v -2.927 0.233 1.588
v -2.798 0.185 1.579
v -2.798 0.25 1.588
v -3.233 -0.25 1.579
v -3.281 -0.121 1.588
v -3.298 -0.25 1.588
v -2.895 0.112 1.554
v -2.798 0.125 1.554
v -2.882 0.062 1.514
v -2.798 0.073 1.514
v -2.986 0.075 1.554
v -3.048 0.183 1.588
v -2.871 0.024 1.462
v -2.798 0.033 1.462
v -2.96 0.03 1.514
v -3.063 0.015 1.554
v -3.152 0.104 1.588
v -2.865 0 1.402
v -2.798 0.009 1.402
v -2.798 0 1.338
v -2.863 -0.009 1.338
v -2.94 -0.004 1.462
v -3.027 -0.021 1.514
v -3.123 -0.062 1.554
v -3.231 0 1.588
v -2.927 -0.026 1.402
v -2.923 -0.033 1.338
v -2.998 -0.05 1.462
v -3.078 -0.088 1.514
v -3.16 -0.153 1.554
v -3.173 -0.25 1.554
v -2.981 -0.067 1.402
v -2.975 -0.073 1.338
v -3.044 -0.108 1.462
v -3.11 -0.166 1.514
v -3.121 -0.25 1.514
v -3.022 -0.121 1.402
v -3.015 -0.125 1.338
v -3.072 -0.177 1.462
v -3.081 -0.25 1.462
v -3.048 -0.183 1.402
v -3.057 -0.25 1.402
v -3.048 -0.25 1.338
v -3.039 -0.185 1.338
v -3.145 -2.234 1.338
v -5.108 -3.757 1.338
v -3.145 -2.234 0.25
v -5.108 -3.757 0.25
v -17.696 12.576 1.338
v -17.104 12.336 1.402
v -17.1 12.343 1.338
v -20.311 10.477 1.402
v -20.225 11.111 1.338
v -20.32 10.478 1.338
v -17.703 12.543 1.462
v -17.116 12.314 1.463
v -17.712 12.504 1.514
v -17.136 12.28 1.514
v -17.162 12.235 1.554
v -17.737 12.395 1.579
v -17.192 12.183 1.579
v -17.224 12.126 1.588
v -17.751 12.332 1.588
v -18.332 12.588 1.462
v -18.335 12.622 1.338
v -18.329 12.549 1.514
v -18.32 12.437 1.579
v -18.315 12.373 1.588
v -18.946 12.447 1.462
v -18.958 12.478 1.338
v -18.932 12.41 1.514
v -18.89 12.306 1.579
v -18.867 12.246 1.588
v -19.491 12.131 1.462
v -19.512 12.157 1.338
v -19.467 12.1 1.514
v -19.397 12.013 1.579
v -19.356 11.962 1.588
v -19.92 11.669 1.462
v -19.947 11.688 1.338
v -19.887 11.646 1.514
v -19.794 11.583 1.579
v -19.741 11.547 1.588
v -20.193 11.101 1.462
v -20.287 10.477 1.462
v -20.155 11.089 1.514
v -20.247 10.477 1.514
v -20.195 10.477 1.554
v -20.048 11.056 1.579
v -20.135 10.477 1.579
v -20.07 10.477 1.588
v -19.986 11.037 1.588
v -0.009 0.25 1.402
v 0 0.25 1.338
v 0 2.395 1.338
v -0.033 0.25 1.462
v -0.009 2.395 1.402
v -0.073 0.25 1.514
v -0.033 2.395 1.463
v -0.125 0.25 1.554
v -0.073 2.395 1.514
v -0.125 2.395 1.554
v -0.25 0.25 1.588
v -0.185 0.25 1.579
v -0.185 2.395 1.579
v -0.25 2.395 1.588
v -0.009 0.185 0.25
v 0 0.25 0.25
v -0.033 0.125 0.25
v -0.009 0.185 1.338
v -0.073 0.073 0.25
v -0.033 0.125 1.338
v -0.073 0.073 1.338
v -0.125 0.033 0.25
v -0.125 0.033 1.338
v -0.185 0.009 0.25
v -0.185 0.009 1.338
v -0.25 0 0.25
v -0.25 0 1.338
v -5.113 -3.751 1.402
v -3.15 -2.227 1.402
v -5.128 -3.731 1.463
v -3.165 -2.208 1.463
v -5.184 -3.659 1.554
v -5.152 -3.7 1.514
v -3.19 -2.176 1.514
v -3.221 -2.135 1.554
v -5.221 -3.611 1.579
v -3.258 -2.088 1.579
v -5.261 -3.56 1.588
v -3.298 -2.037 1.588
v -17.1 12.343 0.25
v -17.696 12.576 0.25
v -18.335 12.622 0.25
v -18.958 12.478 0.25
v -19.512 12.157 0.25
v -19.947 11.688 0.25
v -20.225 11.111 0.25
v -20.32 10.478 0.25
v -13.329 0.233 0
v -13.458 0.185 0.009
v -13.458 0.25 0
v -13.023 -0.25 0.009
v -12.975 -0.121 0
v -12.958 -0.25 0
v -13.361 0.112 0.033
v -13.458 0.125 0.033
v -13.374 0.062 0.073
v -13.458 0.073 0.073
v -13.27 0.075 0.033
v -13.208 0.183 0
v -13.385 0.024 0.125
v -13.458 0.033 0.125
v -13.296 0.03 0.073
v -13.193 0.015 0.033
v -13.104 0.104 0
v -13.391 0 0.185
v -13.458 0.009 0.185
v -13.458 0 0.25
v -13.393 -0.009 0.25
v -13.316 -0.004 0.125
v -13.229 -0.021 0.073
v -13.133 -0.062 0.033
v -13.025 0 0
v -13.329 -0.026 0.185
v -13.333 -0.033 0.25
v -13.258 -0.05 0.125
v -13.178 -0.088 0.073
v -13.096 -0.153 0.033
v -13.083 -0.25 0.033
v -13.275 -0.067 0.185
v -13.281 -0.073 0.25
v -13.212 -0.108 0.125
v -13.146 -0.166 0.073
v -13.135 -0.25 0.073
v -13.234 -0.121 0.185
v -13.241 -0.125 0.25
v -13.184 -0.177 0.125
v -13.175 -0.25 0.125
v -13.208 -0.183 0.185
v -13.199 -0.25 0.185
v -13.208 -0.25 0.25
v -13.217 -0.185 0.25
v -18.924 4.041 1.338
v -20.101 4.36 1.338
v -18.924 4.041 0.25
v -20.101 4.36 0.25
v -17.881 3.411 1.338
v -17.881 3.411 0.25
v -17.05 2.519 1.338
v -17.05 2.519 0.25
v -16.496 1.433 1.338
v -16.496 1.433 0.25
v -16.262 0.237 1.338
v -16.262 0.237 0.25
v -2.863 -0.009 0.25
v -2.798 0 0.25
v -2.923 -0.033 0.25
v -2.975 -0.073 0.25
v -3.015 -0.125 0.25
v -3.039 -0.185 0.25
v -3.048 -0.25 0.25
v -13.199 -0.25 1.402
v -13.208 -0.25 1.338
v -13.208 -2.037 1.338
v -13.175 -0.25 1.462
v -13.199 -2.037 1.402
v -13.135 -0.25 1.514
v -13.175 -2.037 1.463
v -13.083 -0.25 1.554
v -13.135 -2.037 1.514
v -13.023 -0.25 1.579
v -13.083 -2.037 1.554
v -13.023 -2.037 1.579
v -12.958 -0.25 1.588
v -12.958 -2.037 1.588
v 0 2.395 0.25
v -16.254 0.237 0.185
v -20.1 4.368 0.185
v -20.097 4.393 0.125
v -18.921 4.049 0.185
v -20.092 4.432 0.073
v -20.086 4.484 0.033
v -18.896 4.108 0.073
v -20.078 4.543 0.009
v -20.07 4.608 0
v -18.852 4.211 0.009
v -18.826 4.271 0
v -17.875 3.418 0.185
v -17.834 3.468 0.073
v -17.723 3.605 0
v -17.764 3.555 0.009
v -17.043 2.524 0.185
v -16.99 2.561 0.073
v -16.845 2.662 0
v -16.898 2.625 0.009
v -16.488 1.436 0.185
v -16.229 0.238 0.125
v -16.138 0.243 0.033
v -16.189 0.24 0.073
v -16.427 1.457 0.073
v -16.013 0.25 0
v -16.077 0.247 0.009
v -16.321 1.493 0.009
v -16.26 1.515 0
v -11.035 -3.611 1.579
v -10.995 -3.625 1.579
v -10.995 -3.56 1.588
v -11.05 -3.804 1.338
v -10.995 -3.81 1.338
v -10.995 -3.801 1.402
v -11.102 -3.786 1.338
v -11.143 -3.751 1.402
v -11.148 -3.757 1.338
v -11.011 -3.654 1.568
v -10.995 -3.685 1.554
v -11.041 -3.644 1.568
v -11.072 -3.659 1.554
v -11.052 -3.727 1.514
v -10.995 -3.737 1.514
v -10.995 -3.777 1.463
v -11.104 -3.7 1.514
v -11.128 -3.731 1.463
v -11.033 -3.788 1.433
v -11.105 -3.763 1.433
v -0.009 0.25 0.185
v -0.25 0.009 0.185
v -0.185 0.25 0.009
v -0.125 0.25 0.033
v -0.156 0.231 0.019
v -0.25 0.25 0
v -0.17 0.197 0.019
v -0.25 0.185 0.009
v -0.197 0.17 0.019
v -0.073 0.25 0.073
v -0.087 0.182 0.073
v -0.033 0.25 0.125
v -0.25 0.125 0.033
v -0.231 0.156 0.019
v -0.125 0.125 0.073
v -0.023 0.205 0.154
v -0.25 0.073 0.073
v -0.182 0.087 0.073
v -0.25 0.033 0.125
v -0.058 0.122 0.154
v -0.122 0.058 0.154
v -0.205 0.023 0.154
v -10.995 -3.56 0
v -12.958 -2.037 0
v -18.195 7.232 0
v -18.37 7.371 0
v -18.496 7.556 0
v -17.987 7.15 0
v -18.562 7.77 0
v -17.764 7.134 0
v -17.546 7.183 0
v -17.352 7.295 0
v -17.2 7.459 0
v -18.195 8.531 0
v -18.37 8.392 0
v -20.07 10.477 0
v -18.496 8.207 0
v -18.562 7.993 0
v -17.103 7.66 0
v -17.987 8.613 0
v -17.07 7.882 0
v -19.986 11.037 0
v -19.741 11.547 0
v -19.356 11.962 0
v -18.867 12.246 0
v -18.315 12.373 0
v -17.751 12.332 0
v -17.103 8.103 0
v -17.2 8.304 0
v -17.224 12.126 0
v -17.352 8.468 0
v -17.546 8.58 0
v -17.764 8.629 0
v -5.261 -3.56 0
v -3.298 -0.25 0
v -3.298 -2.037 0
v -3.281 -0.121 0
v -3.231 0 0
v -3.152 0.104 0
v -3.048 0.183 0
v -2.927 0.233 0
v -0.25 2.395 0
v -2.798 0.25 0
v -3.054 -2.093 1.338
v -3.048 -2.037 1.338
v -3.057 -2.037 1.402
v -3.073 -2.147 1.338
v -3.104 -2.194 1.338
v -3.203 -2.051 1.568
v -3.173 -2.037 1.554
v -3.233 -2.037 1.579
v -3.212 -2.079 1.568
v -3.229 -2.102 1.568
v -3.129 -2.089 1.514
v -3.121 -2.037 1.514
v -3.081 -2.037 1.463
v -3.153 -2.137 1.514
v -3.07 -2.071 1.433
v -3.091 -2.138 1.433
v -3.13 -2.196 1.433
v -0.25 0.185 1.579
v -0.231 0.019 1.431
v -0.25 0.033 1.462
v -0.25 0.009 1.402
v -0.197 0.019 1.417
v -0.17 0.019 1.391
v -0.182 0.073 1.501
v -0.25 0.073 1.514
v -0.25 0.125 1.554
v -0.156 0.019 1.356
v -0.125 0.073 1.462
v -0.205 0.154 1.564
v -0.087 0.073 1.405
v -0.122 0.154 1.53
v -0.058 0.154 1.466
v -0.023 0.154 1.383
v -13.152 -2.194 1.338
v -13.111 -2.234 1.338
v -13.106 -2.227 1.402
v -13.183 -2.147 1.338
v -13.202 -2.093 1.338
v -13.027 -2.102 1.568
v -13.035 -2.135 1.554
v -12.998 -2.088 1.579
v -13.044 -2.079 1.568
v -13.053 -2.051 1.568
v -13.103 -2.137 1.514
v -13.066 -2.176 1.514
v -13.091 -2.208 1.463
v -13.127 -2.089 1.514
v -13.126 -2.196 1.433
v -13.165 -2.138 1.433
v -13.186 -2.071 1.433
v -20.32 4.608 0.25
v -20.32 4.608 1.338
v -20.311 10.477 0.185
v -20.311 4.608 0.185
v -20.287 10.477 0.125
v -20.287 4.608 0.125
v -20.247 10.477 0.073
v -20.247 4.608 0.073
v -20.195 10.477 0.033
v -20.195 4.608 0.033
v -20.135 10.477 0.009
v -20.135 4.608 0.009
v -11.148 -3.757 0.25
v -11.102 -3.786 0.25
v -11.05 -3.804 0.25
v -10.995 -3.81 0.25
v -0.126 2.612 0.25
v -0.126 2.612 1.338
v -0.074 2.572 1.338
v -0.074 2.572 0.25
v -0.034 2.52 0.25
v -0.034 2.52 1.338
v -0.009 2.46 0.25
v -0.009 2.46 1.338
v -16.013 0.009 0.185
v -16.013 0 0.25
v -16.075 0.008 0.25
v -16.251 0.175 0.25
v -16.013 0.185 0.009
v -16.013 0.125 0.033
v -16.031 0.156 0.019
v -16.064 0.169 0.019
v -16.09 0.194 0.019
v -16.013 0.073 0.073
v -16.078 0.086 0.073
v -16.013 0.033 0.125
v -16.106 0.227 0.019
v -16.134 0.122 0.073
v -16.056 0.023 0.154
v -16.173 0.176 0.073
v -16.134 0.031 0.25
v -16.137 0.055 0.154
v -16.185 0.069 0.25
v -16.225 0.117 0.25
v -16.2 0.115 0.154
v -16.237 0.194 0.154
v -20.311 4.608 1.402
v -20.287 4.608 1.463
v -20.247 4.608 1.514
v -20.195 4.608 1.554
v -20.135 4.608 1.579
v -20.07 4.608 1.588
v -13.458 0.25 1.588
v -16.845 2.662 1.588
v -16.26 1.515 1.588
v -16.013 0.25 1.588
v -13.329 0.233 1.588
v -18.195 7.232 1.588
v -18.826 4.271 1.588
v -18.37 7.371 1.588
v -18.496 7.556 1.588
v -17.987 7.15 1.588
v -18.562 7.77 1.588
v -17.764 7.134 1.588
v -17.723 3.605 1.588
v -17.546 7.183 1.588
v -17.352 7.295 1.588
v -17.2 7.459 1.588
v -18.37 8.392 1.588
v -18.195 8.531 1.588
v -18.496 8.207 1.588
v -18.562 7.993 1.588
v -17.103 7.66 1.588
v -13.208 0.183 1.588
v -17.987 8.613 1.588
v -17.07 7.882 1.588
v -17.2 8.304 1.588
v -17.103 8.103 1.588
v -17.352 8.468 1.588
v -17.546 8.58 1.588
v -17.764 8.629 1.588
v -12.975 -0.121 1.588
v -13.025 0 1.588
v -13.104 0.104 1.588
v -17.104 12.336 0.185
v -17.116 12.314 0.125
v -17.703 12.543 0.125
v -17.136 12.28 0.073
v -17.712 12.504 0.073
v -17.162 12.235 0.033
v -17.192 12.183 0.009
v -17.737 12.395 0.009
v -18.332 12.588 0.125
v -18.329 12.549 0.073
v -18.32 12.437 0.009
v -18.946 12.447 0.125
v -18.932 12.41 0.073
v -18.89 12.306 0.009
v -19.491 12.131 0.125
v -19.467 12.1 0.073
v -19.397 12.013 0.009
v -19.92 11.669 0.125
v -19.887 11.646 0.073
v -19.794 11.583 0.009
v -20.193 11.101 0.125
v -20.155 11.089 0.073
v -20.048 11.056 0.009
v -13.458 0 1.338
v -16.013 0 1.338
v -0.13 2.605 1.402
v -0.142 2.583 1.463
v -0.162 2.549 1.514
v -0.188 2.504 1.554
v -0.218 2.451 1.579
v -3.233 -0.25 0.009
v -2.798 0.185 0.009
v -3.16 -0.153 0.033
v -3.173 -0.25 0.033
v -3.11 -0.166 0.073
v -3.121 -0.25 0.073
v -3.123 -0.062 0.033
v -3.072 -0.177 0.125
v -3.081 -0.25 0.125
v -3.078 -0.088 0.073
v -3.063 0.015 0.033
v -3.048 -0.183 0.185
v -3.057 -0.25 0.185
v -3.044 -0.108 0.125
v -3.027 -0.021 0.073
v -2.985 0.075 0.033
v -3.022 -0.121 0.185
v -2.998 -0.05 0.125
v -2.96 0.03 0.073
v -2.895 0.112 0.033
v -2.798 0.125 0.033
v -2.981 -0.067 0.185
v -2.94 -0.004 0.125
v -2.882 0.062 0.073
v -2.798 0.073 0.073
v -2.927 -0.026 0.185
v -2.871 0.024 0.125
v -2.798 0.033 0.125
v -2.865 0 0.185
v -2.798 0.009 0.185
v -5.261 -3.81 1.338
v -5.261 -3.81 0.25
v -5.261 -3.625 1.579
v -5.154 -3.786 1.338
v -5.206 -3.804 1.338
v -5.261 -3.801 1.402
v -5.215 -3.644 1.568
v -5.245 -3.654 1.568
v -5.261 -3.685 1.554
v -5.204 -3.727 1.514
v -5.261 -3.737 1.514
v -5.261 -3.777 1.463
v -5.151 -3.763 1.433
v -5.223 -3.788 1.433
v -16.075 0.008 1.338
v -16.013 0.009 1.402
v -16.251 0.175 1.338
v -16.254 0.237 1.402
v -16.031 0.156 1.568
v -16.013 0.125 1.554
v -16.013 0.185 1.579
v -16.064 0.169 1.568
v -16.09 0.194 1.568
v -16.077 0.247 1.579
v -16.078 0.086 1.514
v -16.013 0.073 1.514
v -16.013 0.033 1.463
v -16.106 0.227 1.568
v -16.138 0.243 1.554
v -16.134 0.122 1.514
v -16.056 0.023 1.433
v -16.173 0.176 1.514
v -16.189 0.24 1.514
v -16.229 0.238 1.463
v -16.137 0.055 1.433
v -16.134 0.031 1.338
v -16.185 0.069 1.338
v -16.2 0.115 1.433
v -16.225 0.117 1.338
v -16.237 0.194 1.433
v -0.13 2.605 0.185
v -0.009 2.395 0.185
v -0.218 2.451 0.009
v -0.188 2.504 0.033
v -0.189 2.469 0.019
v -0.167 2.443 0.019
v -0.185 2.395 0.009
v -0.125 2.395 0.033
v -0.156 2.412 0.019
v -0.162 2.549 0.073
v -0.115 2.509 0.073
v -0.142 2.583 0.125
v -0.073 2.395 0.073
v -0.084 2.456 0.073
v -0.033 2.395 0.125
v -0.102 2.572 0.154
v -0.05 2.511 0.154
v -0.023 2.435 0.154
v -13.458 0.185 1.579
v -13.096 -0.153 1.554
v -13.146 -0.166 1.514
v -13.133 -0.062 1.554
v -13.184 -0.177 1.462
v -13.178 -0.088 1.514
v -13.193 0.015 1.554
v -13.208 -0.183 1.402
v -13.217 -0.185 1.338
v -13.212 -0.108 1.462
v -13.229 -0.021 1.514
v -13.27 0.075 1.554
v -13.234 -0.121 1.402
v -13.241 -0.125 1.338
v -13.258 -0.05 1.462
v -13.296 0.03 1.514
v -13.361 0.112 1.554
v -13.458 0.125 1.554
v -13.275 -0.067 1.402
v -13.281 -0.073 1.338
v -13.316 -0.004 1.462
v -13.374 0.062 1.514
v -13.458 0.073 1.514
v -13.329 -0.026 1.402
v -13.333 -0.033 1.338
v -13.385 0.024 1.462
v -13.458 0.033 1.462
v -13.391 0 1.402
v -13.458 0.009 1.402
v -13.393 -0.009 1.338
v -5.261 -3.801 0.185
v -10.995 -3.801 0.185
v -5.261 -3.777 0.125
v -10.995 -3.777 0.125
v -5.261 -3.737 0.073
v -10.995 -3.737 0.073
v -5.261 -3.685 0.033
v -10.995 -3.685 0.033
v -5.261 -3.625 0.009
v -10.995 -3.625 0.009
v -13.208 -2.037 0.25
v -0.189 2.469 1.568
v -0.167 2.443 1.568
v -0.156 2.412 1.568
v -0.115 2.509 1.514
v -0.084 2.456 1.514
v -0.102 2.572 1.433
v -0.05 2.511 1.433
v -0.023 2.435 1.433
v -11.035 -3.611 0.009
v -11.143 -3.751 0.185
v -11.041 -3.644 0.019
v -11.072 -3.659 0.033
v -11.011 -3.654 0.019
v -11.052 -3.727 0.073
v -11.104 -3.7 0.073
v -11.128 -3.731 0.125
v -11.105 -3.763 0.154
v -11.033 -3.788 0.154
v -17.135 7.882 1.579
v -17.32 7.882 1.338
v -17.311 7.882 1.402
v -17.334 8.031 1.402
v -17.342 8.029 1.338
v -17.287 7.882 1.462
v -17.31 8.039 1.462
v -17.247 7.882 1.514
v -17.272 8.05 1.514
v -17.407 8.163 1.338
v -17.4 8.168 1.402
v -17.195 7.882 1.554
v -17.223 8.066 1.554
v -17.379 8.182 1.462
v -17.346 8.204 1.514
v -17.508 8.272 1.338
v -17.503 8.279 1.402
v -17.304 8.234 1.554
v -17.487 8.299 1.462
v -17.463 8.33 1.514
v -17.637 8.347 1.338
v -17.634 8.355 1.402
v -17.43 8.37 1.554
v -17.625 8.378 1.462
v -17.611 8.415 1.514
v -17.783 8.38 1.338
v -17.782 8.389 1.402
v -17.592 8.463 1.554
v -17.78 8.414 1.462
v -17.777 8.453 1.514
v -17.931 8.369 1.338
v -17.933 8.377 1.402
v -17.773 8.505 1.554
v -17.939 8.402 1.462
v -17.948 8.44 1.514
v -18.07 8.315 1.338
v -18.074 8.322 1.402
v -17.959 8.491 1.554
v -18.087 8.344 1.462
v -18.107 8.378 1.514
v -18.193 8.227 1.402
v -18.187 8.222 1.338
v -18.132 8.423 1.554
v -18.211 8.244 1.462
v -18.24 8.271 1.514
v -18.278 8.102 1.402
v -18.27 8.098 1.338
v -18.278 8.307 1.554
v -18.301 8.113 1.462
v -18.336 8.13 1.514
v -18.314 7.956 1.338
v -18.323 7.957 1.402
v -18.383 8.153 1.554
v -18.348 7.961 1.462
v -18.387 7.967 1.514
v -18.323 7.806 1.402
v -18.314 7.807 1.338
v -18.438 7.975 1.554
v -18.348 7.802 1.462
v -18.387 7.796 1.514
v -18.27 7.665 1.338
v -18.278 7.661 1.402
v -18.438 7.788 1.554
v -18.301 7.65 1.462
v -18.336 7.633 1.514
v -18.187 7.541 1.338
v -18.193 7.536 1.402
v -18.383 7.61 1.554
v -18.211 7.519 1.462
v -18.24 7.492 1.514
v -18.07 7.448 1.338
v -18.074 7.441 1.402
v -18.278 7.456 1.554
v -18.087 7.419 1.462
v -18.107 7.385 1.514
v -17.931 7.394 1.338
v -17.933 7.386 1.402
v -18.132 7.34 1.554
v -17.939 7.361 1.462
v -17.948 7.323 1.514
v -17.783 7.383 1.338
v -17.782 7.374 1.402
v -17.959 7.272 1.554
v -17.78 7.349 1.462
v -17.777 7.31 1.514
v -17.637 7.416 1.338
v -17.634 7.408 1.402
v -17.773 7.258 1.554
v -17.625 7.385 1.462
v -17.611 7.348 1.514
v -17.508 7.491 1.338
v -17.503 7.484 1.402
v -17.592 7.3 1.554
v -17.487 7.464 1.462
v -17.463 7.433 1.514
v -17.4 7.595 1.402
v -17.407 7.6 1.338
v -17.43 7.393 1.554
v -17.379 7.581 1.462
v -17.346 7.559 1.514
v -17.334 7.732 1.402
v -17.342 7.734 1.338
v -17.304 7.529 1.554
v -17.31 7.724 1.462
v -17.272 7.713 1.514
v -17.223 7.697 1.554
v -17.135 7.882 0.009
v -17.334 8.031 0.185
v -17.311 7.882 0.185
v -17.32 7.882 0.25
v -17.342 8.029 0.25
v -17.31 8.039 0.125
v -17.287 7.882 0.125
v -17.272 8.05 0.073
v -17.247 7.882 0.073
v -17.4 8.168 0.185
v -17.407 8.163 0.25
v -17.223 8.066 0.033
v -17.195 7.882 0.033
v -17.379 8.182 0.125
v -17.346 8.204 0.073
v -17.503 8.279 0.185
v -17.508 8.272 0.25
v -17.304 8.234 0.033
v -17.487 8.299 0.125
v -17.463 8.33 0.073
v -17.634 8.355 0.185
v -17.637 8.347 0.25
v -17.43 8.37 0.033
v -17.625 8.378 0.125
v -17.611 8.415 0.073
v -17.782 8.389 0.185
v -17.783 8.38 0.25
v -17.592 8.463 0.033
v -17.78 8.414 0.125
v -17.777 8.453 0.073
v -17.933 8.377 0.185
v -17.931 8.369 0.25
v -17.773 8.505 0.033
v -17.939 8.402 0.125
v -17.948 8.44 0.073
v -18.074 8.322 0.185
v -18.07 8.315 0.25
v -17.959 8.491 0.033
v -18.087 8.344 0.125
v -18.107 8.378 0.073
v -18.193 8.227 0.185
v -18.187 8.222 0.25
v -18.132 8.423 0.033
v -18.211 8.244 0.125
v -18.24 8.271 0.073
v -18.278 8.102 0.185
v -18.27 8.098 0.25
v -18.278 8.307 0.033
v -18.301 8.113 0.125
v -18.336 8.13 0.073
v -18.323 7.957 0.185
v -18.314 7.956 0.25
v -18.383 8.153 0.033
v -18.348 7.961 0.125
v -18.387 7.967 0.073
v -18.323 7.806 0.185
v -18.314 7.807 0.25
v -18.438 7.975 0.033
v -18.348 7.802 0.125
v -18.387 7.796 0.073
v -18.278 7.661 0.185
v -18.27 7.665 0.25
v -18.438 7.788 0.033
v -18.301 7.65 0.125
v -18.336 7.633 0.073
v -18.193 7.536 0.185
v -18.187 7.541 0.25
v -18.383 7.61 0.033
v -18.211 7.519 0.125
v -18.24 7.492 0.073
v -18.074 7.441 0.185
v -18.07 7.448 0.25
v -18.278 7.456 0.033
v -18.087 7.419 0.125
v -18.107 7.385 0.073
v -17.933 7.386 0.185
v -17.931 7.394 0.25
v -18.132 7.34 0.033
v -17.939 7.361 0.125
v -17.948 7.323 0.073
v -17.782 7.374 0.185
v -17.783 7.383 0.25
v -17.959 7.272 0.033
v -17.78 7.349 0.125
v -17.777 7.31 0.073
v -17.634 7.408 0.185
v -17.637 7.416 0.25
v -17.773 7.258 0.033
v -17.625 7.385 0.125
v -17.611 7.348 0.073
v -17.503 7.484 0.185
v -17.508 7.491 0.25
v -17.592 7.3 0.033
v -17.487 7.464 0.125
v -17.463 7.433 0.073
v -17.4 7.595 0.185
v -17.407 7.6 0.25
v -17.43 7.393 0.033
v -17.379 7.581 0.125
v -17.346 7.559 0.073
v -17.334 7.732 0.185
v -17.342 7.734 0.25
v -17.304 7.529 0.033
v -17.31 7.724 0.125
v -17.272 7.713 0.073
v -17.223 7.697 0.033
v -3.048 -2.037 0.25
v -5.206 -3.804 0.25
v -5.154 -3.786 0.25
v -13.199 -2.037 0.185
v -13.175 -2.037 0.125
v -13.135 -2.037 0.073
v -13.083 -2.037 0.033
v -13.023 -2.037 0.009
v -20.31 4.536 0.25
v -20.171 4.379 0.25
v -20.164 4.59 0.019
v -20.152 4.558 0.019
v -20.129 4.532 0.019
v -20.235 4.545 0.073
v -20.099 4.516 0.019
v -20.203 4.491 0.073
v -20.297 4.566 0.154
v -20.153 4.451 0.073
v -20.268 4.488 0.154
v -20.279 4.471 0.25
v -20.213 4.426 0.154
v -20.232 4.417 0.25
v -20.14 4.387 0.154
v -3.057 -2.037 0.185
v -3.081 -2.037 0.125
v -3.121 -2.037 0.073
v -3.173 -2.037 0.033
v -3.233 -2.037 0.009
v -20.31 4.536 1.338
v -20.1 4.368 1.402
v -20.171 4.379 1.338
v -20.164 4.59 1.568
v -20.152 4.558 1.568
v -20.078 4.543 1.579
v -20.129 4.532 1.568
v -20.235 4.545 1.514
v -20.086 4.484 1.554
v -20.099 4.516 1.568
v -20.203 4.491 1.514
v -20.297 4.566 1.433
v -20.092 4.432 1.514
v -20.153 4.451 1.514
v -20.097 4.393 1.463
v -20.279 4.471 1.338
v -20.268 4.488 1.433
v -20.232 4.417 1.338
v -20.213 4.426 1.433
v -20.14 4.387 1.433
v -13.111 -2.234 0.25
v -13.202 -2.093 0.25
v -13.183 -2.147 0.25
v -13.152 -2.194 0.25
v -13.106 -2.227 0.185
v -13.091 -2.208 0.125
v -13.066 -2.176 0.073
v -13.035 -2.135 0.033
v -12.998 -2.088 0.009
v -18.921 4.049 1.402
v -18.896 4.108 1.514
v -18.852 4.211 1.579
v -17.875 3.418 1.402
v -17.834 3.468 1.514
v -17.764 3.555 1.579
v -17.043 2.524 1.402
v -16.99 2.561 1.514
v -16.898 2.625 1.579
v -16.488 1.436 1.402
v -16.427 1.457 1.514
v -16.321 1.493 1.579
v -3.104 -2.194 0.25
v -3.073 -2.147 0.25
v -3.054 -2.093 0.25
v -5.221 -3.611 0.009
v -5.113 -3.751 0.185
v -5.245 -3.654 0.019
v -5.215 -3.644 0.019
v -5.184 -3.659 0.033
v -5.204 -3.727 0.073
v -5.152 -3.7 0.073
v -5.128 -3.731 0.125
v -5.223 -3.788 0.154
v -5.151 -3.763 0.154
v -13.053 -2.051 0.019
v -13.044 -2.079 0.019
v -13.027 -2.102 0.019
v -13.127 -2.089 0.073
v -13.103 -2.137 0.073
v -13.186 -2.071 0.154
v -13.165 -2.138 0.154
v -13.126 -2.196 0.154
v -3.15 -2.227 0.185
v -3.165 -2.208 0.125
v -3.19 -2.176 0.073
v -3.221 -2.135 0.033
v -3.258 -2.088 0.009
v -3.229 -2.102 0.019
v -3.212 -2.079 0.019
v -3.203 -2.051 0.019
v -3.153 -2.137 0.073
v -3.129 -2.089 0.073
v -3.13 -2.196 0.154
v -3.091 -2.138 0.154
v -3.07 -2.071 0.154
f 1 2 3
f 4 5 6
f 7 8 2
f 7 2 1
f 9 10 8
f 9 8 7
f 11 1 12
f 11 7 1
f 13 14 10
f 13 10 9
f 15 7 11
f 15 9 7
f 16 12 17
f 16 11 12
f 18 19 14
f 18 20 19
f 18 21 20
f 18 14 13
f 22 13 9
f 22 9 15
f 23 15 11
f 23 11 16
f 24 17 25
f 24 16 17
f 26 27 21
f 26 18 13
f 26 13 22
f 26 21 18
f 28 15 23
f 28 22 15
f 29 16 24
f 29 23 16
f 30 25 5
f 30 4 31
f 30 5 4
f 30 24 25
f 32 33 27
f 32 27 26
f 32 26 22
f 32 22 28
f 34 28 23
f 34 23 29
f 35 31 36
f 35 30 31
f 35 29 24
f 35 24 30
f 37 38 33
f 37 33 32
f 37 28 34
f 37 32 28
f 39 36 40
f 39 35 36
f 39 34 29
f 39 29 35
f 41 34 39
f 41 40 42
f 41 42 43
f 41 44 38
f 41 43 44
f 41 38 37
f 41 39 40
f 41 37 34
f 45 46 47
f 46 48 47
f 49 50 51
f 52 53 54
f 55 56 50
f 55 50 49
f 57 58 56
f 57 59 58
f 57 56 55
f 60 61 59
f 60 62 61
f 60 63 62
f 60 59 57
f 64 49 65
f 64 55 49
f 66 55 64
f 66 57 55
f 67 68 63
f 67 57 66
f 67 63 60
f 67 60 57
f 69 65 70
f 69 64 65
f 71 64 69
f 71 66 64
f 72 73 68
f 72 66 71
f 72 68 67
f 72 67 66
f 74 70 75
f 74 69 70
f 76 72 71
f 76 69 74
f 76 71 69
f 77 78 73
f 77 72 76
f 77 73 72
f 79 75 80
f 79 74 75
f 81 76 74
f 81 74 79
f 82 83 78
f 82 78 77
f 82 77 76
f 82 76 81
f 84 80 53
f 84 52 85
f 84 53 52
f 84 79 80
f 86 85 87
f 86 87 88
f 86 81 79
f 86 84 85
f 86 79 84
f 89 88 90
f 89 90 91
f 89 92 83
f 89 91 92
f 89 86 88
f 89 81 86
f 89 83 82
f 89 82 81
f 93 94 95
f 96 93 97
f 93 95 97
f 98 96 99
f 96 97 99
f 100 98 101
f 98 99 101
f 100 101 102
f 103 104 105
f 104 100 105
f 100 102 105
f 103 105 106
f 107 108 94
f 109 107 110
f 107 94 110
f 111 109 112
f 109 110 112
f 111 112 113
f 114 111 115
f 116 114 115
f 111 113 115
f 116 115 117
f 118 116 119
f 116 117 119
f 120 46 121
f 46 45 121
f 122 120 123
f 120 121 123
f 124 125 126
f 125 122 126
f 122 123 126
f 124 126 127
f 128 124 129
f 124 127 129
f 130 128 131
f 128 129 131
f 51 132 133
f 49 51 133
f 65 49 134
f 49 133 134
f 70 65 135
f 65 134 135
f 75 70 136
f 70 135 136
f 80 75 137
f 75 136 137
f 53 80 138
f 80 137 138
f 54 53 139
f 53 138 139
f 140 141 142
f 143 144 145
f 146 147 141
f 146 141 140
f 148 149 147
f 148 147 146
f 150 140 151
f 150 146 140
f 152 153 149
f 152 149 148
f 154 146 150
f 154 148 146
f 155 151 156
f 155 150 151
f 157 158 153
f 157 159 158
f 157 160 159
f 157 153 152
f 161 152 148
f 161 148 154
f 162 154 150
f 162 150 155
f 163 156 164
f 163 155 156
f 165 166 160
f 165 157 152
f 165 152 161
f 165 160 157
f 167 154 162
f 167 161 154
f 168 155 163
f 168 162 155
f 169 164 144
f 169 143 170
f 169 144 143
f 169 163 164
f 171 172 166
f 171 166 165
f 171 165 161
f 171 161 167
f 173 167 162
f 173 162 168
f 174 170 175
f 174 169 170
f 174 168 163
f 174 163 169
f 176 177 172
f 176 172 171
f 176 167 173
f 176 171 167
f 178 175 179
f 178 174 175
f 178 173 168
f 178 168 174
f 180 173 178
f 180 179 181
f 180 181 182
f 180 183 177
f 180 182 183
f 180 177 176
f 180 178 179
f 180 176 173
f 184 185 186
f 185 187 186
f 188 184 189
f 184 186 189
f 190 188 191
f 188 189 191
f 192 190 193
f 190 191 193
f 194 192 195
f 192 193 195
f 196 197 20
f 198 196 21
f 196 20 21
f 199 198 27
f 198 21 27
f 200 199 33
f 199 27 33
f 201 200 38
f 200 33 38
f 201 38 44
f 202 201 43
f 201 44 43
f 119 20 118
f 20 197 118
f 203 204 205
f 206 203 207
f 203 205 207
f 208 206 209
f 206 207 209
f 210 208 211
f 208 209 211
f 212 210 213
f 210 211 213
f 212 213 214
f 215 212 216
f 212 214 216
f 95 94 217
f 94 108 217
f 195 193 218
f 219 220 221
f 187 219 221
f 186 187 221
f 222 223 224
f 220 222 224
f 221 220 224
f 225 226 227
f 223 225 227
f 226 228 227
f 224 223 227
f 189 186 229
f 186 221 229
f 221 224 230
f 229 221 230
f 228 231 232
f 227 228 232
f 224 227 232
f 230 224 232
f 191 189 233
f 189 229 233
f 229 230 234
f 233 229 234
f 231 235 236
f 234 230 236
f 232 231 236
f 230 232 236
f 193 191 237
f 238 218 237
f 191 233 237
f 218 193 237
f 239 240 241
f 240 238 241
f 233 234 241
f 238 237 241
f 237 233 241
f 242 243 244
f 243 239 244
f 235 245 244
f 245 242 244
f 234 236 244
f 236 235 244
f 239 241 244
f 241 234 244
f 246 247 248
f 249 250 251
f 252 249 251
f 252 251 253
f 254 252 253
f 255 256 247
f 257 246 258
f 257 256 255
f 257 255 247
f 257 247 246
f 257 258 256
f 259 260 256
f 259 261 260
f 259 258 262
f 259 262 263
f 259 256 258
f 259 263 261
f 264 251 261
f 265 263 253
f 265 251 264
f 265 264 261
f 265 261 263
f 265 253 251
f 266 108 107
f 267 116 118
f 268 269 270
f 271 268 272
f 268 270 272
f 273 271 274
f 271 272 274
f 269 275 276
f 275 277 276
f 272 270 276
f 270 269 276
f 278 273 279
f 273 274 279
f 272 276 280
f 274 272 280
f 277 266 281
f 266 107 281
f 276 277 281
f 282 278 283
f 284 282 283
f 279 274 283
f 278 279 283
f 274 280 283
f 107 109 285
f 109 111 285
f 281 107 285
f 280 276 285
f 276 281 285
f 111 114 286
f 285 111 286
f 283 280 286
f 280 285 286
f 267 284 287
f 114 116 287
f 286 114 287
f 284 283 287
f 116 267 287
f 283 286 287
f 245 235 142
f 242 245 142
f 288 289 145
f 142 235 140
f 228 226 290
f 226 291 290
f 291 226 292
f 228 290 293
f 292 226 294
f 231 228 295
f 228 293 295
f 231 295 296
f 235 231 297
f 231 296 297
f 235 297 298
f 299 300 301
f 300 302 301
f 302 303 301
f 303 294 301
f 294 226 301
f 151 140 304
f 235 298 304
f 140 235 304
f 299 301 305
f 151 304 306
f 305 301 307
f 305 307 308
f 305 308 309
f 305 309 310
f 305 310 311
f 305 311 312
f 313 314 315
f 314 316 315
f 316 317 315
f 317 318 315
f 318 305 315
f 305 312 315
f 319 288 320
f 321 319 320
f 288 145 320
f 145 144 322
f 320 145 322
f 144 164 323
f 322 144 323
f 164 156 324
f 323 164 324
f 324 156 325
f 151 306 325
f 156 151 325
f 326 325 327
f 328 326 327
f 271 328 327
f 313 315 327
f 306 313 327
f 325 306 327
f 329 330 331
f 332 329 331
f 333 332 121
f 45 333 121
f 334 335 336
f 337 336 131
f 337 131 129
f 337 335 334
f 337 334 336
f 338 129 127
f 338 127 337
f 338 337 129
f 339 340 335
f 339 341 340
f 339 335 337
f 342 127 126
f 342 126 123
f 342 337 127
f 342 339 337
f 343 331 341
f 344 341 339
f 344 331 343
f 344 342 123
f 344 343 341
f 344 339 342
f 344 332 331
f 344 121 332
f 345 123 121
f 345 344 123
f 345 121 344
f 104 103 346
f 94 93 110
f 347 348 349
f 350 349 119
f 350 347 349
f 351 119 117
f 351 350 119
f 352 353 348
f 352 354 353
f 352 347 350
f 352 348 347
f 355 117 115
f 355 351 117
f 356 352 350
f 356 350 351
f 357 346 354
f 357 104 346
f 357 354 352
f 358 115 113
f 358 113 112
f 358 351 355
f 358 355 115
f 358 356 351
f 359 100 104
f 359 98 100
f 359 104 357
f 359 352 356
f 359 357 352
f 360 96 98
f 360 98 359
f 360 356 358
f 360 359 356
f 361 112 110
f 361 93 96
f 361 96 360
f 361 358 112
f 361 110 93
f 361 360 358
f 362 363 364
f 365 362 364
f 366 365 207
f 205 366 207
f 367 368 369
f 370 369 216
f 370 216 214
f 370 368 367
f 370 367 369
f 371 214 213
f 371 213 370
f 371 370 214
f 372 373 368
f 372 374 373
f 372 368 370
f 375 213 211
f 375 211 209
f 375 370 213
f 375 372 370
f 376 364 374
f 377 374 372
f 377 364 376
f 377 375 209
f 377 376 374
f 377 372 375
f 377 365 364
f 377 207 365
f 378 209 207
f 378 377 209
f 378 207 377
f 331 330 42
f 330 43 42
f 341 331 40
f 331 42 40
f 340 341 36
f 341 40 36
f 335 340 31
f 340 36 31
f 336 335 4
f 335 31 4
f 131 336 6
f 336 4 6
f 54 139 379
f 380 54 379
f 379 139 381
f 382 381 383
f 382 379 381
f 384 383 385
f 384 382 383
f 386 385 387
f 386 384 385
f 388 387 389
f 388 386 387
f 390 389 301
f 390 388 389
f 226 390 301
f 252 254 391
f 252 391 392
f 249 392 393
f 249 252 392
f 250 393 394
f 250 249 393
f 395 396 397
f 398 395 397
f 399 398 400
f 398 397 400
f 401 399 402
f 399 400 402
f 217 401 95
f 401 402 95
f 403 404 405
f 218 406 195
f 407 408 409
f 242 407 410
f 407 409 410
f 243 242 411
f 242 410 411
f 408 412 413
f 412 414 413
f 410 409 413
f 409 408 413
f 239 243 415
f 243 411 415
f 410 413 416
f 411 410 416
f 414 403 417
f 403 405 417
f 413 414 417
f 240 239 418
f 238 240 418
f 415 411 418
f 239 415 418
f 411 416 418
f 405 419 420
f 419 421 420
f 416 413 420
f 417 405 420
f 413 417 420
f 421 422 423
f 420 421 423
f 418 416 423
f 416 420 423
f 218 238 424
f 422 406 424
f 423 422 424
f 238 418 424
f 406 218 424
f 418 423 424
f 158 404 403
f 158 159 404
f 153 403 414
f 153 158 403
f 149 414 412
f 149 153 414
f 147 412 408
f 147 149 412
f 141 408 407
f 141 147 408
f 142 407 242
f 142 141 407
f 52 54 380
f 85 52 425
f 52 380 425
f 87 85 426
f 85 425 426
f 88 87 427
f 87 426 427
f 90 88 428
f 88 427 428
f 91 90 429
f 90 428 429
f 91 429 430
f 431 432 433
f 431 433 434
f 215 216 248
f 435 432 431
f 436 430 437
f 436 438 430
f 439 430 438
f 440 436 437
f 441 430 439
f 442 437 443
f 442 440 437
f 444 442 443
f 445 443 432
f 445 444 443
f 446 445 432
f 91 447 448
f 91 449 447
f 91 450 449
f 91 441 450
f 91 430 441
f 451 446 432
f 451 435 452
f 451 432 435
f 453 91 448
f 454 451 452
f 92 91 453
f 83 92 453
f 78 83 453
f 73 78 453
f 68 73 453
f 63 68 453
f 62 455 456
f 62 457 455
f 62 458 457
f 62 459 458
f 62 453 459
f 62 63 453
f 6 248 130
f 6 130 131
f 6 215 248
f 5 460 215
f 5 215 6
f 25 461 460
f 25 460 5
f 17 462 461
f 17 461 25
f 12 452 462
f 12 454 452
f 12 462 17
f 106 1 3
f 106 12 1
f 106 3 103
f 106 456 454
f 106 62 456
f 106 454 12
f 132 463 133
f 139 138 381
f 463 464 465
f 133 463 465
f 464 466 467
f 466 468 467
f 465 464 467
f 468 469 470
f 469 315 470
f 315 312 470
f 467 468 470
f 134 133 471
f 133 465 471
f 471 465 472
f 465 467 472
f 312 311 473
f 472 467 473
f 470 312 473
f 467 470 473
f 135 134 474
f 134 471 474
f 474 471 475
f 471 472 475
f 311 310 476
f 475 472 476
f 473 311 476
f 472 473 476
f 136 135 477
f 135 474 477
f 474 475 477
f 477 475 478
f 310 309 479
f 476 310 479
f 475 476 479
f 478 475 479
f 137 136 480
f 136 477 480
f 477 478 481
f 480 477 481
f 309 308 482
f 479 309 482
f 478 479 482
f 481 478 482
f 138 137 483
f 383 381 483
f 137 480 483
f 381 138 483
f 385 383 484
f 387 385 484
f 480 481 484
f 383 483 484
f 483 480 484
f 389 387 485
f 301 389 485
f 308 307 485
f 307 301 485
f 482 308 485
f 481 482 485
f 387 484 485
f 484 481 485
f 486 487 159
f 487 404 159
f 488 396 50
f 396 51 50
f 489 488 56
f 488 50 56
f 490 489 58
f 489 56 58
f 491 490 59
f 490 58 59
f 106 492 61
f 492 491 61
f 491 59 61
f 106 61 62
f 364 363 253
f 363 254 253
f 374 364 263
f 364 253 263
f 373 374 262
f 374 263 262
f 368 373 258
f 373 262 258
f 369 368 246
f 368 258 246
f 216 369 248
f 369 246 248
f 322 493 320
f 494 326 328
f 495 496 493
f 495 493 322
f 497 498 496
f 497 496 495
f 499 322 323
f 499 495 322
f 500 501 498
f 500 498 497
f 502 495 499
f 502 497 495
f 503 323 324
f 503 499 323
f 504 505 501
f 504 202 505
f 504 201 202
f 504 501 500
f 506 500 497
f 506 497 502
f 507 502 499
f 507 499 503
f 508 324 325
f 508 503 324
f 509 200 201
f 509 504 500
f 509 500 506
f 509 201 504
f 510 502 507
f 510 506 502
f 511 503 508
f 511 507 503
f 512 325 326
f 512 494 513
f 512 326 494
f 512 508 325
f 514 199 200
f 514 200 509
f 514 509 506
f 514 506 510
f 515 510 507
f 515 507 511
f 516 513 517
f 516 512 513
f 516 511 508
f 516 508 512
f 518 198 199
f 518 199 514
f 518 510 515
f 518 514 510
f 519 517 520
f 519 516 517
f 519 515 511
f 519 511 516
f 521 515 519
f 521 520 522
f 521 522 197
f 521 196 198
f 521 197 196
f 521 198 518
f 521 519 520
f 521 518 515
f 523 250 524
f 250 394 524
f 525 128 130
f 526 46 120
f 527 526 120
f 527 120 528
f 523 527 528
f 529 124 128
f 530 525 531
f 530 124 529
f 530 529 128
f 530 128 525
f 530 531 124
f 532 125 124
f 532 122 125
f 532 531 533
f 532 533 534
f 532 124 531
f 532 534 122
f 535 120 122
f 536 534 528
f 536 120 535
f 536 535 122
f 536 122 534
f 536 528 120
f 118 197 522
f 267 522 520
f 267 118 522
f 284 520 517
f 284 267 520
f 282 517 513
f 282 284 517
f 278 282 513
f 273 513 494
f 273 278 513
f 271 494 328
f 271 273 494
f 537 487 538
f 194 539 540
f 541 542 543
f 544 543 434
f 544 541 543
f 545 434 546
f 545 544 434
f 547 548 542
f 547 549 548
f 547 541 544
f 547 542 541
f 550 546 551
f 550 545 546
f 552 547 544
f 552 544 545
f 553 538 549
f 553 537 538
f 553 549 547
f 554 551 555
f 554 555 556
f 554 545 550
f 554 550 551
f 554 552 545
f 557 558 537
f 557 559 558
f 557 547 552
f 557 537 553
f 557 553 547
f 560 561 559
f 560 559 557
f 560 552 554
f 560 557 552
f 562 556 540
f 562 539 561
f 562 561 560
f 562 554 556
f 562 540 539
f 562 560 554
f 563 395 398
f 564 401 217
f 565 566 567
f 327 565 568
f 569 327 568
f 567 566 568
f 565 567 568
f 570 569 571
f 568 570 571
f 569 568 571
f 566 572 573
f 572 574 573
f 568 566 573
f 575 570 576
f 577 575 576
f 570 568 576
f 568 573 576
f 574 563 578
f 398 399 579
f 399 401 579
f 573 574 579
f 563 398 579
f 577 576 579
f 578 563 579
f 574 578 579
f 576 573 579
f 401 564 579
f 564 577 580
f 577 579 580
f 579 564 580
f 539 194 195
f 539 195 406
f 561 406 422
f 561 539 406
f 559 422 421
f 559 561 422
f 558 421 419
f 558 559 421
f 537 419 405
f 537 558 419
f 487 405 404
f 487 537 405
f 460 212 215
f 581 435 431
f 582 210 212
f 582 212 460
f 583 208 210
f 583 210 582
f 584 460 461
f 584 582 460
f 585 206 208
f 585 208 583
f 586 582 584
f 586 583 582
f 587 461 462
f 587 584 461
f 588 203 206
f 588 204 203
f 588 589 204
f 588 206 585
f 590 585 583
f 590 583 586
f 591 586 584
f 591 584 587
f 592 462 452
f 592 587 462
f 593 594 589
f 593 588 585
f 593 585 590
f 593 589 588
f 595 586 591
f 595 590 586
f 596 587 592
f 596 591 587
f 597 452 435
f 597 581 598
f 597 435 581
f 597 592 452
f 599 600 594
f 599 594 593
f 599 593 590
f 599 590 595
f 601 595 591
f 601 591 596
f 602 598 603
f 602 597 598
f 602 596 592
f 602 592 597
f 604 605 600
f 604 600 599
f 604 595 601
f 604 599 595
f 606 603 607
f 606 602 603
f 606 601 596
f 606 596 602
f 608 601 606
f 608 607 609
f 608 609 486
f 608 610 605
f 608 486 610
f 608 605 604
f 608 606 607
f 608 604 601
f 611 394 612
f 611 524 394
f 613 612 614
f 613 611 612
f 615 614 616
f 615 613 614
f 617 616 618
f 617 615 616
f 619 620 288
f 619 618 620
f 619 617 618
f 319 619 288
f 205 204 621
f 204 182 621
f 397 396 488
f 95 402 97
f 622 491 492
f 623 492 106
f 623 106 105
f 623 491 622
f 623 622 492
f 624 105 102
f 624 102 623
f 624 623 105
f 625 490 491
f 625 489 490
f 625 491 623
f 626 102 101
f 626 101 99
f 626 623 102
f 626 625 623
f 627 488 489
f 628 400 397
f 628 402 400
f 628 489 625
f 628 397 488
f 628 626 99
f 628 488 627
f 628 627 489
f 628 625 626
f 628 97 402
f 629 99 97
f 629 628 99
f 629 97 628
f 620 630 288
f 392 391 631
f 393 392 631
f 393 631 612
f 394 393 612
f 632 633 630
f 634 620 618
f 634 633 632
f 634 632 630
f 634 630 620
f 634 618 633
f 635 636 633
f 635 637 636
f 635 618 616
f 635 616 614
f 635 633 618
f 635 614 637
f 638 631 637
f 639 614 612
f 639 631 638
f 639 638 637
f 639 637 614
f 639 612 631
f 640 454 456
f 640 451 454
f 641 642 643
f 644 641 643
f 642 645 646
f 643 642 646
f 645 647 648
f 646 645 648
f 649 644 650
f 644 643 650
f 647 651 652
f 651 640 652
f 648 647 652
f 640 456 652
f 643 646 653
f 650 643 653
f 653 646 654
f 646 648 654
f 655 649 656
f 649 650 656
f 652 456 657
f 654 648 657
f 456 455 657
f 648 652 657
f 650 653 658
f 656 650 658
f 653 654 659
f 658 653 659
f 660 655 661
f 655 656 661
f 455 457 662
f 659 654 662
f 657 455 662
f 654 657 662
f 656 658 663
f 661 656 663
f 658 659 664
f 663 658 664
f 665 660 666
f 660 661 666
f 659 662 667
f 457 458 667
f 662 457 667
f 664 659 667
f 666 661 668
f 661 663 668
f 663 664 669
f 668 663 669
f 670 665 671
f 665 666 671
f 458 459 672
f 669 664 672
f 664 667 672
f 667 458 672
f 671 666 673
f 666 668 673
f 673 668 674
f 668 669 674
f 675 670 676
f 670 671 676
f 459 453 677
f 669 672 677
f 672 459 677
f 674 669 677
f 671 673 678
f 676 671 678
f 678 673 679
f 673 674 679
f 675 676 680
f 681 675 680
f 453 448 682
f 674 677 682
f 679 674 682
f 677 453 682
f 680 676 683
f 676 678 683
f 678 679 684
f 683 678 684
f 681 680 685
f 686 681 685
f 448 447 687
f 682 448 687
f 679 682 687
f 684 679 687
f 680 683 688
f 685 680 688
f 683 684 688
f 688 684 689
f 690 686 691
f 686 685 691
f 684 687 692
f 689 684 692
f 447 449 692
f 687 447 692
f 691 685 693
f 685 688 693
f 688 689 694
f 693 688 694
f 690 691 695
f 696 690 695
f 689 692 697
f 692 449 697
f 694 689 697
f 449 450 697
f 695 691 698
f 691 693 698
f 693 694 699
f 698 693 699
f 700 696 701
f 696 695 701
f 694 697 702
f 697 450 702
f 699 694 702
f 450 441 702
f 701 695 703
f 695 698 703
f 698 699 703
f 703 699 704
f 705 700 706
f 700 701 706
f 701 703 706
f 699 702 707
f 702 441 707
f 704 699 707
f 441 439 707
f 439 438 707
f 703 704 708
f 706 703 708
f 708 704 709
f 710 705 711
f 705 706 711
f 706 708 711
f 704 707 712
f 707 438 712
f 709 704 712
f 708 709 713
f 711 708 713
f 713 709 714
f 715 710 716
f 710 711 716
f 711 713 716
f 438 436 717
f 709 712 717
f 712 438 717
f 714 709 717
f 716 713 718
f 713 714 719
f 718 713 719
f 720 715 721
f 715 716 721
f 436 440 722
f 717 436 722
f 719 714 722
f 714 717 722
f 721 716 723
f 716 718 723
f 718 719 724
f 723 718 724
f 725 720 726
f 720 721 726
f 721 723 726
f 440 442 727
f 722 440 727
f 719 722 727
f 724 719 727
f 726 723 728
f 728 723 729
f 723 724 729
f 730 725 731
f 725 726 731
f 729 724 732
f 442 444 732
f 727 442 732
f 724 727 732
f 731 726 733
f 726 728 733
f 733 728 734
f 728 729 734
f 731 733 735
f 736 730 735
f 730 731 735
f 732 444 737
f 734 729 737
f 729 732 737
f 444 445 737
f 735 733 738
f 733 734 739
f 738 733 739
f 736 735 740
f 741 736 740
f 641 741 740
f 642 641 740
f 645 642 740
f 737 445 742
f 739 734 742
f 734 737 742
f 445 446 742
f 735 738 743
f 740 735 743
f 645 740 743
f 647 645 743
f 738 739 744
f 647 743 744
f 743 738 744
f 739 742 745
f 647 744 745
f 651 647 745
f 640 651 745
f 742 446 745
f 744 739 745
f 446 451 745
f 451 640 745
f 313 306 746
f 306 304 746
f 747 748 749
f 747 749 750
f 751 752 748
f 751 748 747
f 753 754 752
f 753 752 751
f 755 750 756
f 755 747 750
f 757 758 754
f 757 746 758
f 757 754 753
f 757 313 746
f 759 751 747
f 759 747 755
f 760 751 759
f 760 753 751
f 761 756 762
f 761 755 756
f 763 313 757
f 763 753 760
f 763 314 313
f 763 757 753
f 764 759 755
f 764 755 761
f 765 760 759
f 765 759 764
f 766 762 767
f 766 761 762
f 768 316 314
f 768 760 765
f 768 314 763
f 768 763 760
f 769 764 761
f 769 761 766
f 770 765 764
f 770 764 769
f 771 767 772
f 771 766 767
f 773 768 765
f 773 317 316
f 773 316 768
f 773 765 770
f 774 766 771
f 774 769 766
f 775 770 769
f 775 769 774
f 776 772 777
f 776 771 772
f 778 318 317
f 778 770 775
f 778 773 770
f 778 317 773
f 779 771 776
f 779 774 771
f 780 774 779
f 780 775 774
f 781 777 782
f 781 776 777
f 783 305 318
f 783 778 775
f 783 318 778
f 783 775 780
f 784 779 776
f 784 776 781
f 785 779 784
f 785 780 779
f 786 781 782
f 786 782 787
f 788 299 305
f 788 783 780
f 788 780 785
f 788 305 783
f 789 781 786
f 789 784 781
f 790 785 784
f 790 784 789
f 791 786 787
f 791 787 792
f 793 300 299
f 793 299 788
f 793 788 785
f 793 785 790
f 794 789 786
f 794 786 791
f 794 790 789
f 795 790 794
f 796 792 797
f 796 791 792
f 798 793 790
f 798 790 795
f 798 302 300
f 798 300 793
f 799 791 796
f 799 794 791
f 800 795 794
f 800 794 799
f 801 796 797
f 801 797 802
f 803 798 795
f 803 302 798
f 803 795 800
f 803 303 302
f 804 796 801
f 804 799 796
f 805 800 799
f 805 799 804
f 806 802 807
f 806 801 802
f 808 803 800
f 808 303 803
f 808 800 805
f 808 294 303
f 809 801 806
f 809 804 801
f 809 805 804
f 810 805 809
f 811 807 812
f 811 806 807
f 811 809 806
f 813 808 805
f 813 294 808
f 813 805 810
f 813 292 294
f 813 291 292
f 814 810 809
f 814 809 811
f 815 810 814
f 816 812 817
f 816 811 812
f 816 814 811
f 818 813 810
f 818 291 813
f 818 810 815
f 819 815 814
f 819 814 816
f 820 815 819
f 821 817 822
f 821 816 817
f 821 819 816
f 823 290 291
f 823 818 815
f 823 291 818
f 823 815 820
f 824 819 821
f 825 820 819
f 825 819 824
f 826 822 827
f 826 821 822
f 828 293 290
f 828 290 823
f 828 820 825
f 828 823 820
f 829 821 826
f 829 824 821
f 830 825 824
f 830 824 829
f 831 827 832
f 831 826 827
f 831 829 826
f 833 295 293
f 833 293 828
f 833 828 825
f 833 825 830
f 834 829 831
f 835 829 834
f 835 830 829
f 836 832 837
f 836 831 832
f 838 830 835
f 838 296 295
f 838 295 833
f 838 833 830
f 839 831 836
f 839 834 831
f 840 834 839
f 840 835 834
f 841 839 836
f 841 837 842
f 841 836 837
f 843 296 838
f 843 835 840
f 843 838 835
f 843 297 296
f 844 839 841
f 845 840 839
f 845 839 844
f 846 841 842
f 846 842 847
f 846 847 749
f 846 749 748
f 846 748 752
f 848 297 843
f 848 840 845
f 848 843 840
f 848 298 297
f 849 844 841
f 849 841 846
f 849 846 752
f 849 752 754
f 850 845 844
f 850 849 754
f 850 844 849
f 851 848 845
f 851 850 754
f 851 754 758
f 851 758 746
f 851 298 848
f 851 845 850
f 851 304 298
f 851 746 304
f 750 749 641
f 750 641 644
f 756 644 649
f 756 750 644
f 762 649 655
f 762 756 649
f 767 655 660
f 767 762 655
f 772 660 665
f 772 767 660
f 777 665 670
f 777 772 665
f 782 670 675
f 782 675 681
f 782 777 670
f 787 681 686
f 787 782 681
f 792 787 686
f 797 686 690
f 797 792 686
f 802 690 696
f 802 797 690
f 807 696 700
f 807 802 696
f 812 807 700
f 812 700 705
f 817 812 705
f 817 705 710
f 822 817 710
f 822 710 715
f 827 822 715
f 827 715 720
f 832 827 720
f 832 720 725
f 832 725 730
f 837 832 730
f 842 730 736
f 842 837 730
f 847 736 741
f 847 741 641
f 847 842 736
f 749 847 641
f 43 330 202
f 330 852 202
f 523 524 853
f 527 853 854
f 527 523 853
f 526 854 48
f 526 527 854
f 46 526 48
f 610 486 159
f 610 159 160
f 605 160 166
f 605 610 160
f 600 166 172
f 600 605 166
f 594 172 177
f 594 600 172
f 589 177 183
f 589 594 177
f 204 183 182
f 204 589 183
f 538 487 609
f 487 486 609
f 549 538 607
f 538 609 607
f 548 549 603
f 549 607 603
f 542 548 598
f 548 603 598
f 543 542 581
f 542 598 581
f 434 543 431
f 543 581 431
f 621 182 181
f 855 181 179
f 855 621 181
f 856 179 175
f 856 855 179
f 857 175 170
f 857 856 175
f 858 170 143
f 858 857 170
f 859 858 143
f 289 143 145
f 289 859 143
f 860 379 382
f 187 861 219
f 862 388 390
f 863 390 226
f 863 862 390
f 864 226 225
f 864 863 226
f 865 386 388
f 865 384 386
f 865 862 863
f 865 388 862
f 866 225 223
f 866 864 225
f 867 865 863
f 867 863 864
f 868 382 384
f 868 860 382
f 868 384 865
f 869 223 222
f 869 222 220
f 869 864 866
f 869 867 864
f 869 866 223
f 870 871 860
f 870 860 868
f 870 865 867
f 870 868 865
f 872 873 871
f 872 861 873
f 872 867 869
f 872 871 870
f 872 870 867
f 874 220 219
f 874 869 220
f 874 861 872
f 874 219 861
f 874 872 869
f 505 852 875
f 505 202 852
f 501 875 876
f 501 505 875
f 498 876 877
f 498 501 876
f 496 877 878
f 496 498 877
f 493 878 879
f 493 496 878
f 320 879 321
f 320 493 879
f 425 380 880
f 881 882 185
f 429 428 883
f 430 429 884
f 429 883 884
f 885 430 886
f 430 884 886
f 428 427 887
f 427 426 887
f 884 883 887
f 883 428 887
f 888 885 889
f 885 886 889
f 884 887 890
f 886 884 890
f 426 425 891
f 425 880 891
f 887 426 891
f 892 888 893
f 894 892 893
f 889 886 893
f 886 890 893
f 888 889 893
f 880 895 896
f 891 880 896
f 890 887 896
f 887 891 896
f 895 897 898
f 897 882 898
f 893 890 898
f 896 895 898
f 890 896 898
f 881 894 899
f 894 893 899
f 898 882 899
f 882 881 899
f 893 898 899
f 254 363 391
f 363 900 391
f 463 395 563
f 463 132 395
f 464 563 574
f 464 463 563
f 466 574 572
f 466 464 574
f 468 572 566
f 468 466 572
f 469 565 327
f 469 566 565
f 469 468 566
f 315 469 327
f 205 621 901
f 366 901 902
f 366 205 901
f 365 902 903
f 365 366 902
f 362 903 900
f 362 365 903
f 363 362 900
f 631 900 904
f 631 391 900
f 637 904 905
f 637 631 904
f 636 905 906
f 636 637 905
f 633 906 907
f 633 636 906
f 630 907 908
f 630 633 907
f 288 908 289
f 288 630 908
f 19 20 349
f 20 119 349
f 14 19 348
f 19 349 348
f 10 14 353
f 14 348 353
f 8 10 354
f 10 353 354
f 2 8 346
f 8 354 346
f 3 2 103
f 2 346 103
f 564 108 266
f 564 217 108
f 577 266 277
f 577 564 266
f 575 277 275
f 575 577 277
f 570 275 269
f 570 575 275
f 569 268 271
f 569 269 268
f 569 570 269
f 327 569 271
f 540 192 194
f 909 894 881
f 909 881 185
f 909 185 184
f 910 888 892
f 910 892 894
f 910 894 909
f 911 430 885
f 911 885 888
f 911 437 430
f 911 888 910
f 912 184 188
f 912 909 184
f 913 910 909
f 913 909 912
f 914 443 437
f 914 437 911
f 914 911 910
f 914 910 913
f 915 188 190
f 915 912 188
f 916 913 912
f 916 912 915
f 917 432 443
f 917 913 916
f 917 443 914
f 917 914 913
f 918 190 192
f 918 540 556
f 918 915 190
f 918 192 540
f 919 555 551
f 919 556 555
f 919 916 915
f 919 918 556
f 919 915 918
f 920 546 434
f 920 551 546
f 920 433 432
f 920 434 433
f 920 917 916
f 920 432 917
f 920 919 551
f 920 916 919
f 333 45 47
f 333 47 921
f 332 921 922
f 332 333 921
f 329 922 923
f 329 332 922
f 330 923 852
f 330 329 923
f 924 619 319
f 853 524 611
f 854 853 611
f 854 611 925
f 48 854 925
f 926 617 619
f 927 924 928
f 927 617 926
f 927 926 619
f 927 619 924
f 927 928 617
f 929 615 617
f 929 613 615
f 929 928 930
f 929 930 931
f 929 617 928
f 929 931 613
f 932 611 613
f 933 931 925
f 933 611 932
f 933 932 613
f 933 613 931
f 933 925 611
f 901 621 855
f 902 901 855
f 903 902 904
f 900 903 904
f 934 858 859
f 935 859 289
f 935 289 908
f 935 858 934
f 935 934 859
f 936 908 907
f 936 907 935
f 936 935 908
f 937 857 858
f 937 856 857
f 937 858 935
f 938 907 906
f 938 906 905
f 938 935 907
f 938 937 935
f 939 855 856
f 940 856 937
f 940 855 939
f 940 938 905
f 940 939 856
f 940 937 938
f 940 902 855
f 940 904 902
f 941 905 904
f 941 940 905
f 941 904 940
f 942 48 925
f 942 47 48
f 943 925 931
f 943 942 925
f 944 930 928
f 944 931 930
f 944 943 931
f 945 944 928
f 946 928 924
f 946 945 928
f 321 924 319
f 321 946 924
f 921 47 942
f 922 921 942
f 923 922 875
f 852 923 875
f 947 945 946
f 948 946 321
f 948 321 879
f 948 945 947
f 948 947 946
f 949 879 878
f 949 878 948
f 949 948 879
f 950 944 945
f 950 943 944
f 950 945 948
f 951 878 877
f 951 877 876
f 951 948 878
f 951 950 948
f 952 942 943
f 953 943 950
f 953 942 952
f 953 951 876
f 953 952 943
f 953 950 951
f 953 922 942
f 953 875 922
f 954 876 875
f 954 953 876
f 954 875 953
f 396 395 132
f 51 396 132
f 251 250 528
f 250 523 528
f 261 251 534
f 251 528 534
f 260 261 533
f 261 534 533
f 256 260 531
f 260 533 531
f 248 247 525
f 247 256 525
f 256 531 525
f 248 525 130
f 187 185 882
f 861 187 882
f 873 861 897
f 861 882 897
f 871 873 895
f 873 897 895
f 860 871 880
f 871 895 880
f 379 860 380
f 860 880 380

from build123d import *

# Parameters (mm, degrees)
F0_R     = 0.5
F1_DEPTH = 1.5875
F2_R     = 0.25


with BuildPart() as f1:
    # F0 (on Top) → F1 (new body)
    with BuildSketch(Plane.XY):
        with BuildLine():
            ThreePointArc((-20.32, 4.3815), (-17.4284169342, 2.9880444378), (-16.256, 0))
            Line((-16.256, 0), (-13.208, 0))
            Line((-13.208, 0), (-13.208, -2.159))
            Line((-13.208, -2.159), (-11.08075, -3.81))
            Line((-11.08075, -3.81), (-5.17525, -3.81))
            Line((-5.17525, -3.81), (-3.048, -2.159))
            Line((-3.048, -2.159), (-3.048, 0))
            Line((-3.048, 0), (0, 0))
            Line((0, 0), (0, 2.54))
            Line((0, 2.54), (-17.0995334348, 12.3433578162))
            ThreePointArc((-17.0995334348, 12.3433578162), (-19.2474502496, 12.3384695247), (-20.32, 10.4775))
            Line((-20.32, 10.4775), (-20.32, 4.3815))
        make_face()
        with Locations((-17.82, 7.8815)):
            Circle(F0_R, mode=Mode.SUBTRACT)
    extrude(amount=F1_DEPTH)

    # F2
    f2_edges = [f1.edges().sort_by_distance(p)[0] for p in [
        (-20.32, 7.4295, 1.5875),
        (-19.24745, 12.33847, 1.5875),
        (-8.549767, 7.441679, 1.5875),
        (0, 1.27, 1.5875),
        (-1.524, 0, 1.5875),
        (-3.048, -1.0795, 1.5875),
        (-4.111625, -2.9845, 1.5875),
        (-8.128, -3.81, 1.5875),
        (-12.144375, -2.9845, 1.5875),
        (-13.208, -1.0795, 1.5875),
        (-14.732, 0, 1.5875),
        (-17.428417, 2.988044, 1.5875),
        (-17.428417, 2.988044, 0),
        (-20.32, 4.3815, 0.79375),
        (0, 0, 0.79375),
        (0, 2.54, 0.79375),
        (-3.048, 0, 0.79375),
        (-3.048, -2.159, 0.79375),
        (-5.17525, -3.81, 0.79375),
        (-11.08075, -3.81, 0.79375),
        (-13.208, -2.159, 0.79375),
        (-20.32, 7.4295, 0),
        (-19.24745, 12.33847, 0),
        (-8.549767, 7.441679, 0),
        (0, 1.27, 0),
        (-13.208, -1.0795, 0),
        (-12.144375, -2.9845, 0),
        (-8.128, -3.81, 0),
        (-4.111625, -2.9845, 0),
        (-3.048, -1.0795, 0),
        (-1.524, 0, 0),
        (-16.256, 0, 0.79375),
        (-13.208, 0, 0.79375),
        (-18.32, 7.8815, 1.5875),
        (-18.32, 7.8815, 0),
        (-14.732, 0, 0),
    ]]
    fillet(f2_edges, radius=F2_R)


solid = f1.part
